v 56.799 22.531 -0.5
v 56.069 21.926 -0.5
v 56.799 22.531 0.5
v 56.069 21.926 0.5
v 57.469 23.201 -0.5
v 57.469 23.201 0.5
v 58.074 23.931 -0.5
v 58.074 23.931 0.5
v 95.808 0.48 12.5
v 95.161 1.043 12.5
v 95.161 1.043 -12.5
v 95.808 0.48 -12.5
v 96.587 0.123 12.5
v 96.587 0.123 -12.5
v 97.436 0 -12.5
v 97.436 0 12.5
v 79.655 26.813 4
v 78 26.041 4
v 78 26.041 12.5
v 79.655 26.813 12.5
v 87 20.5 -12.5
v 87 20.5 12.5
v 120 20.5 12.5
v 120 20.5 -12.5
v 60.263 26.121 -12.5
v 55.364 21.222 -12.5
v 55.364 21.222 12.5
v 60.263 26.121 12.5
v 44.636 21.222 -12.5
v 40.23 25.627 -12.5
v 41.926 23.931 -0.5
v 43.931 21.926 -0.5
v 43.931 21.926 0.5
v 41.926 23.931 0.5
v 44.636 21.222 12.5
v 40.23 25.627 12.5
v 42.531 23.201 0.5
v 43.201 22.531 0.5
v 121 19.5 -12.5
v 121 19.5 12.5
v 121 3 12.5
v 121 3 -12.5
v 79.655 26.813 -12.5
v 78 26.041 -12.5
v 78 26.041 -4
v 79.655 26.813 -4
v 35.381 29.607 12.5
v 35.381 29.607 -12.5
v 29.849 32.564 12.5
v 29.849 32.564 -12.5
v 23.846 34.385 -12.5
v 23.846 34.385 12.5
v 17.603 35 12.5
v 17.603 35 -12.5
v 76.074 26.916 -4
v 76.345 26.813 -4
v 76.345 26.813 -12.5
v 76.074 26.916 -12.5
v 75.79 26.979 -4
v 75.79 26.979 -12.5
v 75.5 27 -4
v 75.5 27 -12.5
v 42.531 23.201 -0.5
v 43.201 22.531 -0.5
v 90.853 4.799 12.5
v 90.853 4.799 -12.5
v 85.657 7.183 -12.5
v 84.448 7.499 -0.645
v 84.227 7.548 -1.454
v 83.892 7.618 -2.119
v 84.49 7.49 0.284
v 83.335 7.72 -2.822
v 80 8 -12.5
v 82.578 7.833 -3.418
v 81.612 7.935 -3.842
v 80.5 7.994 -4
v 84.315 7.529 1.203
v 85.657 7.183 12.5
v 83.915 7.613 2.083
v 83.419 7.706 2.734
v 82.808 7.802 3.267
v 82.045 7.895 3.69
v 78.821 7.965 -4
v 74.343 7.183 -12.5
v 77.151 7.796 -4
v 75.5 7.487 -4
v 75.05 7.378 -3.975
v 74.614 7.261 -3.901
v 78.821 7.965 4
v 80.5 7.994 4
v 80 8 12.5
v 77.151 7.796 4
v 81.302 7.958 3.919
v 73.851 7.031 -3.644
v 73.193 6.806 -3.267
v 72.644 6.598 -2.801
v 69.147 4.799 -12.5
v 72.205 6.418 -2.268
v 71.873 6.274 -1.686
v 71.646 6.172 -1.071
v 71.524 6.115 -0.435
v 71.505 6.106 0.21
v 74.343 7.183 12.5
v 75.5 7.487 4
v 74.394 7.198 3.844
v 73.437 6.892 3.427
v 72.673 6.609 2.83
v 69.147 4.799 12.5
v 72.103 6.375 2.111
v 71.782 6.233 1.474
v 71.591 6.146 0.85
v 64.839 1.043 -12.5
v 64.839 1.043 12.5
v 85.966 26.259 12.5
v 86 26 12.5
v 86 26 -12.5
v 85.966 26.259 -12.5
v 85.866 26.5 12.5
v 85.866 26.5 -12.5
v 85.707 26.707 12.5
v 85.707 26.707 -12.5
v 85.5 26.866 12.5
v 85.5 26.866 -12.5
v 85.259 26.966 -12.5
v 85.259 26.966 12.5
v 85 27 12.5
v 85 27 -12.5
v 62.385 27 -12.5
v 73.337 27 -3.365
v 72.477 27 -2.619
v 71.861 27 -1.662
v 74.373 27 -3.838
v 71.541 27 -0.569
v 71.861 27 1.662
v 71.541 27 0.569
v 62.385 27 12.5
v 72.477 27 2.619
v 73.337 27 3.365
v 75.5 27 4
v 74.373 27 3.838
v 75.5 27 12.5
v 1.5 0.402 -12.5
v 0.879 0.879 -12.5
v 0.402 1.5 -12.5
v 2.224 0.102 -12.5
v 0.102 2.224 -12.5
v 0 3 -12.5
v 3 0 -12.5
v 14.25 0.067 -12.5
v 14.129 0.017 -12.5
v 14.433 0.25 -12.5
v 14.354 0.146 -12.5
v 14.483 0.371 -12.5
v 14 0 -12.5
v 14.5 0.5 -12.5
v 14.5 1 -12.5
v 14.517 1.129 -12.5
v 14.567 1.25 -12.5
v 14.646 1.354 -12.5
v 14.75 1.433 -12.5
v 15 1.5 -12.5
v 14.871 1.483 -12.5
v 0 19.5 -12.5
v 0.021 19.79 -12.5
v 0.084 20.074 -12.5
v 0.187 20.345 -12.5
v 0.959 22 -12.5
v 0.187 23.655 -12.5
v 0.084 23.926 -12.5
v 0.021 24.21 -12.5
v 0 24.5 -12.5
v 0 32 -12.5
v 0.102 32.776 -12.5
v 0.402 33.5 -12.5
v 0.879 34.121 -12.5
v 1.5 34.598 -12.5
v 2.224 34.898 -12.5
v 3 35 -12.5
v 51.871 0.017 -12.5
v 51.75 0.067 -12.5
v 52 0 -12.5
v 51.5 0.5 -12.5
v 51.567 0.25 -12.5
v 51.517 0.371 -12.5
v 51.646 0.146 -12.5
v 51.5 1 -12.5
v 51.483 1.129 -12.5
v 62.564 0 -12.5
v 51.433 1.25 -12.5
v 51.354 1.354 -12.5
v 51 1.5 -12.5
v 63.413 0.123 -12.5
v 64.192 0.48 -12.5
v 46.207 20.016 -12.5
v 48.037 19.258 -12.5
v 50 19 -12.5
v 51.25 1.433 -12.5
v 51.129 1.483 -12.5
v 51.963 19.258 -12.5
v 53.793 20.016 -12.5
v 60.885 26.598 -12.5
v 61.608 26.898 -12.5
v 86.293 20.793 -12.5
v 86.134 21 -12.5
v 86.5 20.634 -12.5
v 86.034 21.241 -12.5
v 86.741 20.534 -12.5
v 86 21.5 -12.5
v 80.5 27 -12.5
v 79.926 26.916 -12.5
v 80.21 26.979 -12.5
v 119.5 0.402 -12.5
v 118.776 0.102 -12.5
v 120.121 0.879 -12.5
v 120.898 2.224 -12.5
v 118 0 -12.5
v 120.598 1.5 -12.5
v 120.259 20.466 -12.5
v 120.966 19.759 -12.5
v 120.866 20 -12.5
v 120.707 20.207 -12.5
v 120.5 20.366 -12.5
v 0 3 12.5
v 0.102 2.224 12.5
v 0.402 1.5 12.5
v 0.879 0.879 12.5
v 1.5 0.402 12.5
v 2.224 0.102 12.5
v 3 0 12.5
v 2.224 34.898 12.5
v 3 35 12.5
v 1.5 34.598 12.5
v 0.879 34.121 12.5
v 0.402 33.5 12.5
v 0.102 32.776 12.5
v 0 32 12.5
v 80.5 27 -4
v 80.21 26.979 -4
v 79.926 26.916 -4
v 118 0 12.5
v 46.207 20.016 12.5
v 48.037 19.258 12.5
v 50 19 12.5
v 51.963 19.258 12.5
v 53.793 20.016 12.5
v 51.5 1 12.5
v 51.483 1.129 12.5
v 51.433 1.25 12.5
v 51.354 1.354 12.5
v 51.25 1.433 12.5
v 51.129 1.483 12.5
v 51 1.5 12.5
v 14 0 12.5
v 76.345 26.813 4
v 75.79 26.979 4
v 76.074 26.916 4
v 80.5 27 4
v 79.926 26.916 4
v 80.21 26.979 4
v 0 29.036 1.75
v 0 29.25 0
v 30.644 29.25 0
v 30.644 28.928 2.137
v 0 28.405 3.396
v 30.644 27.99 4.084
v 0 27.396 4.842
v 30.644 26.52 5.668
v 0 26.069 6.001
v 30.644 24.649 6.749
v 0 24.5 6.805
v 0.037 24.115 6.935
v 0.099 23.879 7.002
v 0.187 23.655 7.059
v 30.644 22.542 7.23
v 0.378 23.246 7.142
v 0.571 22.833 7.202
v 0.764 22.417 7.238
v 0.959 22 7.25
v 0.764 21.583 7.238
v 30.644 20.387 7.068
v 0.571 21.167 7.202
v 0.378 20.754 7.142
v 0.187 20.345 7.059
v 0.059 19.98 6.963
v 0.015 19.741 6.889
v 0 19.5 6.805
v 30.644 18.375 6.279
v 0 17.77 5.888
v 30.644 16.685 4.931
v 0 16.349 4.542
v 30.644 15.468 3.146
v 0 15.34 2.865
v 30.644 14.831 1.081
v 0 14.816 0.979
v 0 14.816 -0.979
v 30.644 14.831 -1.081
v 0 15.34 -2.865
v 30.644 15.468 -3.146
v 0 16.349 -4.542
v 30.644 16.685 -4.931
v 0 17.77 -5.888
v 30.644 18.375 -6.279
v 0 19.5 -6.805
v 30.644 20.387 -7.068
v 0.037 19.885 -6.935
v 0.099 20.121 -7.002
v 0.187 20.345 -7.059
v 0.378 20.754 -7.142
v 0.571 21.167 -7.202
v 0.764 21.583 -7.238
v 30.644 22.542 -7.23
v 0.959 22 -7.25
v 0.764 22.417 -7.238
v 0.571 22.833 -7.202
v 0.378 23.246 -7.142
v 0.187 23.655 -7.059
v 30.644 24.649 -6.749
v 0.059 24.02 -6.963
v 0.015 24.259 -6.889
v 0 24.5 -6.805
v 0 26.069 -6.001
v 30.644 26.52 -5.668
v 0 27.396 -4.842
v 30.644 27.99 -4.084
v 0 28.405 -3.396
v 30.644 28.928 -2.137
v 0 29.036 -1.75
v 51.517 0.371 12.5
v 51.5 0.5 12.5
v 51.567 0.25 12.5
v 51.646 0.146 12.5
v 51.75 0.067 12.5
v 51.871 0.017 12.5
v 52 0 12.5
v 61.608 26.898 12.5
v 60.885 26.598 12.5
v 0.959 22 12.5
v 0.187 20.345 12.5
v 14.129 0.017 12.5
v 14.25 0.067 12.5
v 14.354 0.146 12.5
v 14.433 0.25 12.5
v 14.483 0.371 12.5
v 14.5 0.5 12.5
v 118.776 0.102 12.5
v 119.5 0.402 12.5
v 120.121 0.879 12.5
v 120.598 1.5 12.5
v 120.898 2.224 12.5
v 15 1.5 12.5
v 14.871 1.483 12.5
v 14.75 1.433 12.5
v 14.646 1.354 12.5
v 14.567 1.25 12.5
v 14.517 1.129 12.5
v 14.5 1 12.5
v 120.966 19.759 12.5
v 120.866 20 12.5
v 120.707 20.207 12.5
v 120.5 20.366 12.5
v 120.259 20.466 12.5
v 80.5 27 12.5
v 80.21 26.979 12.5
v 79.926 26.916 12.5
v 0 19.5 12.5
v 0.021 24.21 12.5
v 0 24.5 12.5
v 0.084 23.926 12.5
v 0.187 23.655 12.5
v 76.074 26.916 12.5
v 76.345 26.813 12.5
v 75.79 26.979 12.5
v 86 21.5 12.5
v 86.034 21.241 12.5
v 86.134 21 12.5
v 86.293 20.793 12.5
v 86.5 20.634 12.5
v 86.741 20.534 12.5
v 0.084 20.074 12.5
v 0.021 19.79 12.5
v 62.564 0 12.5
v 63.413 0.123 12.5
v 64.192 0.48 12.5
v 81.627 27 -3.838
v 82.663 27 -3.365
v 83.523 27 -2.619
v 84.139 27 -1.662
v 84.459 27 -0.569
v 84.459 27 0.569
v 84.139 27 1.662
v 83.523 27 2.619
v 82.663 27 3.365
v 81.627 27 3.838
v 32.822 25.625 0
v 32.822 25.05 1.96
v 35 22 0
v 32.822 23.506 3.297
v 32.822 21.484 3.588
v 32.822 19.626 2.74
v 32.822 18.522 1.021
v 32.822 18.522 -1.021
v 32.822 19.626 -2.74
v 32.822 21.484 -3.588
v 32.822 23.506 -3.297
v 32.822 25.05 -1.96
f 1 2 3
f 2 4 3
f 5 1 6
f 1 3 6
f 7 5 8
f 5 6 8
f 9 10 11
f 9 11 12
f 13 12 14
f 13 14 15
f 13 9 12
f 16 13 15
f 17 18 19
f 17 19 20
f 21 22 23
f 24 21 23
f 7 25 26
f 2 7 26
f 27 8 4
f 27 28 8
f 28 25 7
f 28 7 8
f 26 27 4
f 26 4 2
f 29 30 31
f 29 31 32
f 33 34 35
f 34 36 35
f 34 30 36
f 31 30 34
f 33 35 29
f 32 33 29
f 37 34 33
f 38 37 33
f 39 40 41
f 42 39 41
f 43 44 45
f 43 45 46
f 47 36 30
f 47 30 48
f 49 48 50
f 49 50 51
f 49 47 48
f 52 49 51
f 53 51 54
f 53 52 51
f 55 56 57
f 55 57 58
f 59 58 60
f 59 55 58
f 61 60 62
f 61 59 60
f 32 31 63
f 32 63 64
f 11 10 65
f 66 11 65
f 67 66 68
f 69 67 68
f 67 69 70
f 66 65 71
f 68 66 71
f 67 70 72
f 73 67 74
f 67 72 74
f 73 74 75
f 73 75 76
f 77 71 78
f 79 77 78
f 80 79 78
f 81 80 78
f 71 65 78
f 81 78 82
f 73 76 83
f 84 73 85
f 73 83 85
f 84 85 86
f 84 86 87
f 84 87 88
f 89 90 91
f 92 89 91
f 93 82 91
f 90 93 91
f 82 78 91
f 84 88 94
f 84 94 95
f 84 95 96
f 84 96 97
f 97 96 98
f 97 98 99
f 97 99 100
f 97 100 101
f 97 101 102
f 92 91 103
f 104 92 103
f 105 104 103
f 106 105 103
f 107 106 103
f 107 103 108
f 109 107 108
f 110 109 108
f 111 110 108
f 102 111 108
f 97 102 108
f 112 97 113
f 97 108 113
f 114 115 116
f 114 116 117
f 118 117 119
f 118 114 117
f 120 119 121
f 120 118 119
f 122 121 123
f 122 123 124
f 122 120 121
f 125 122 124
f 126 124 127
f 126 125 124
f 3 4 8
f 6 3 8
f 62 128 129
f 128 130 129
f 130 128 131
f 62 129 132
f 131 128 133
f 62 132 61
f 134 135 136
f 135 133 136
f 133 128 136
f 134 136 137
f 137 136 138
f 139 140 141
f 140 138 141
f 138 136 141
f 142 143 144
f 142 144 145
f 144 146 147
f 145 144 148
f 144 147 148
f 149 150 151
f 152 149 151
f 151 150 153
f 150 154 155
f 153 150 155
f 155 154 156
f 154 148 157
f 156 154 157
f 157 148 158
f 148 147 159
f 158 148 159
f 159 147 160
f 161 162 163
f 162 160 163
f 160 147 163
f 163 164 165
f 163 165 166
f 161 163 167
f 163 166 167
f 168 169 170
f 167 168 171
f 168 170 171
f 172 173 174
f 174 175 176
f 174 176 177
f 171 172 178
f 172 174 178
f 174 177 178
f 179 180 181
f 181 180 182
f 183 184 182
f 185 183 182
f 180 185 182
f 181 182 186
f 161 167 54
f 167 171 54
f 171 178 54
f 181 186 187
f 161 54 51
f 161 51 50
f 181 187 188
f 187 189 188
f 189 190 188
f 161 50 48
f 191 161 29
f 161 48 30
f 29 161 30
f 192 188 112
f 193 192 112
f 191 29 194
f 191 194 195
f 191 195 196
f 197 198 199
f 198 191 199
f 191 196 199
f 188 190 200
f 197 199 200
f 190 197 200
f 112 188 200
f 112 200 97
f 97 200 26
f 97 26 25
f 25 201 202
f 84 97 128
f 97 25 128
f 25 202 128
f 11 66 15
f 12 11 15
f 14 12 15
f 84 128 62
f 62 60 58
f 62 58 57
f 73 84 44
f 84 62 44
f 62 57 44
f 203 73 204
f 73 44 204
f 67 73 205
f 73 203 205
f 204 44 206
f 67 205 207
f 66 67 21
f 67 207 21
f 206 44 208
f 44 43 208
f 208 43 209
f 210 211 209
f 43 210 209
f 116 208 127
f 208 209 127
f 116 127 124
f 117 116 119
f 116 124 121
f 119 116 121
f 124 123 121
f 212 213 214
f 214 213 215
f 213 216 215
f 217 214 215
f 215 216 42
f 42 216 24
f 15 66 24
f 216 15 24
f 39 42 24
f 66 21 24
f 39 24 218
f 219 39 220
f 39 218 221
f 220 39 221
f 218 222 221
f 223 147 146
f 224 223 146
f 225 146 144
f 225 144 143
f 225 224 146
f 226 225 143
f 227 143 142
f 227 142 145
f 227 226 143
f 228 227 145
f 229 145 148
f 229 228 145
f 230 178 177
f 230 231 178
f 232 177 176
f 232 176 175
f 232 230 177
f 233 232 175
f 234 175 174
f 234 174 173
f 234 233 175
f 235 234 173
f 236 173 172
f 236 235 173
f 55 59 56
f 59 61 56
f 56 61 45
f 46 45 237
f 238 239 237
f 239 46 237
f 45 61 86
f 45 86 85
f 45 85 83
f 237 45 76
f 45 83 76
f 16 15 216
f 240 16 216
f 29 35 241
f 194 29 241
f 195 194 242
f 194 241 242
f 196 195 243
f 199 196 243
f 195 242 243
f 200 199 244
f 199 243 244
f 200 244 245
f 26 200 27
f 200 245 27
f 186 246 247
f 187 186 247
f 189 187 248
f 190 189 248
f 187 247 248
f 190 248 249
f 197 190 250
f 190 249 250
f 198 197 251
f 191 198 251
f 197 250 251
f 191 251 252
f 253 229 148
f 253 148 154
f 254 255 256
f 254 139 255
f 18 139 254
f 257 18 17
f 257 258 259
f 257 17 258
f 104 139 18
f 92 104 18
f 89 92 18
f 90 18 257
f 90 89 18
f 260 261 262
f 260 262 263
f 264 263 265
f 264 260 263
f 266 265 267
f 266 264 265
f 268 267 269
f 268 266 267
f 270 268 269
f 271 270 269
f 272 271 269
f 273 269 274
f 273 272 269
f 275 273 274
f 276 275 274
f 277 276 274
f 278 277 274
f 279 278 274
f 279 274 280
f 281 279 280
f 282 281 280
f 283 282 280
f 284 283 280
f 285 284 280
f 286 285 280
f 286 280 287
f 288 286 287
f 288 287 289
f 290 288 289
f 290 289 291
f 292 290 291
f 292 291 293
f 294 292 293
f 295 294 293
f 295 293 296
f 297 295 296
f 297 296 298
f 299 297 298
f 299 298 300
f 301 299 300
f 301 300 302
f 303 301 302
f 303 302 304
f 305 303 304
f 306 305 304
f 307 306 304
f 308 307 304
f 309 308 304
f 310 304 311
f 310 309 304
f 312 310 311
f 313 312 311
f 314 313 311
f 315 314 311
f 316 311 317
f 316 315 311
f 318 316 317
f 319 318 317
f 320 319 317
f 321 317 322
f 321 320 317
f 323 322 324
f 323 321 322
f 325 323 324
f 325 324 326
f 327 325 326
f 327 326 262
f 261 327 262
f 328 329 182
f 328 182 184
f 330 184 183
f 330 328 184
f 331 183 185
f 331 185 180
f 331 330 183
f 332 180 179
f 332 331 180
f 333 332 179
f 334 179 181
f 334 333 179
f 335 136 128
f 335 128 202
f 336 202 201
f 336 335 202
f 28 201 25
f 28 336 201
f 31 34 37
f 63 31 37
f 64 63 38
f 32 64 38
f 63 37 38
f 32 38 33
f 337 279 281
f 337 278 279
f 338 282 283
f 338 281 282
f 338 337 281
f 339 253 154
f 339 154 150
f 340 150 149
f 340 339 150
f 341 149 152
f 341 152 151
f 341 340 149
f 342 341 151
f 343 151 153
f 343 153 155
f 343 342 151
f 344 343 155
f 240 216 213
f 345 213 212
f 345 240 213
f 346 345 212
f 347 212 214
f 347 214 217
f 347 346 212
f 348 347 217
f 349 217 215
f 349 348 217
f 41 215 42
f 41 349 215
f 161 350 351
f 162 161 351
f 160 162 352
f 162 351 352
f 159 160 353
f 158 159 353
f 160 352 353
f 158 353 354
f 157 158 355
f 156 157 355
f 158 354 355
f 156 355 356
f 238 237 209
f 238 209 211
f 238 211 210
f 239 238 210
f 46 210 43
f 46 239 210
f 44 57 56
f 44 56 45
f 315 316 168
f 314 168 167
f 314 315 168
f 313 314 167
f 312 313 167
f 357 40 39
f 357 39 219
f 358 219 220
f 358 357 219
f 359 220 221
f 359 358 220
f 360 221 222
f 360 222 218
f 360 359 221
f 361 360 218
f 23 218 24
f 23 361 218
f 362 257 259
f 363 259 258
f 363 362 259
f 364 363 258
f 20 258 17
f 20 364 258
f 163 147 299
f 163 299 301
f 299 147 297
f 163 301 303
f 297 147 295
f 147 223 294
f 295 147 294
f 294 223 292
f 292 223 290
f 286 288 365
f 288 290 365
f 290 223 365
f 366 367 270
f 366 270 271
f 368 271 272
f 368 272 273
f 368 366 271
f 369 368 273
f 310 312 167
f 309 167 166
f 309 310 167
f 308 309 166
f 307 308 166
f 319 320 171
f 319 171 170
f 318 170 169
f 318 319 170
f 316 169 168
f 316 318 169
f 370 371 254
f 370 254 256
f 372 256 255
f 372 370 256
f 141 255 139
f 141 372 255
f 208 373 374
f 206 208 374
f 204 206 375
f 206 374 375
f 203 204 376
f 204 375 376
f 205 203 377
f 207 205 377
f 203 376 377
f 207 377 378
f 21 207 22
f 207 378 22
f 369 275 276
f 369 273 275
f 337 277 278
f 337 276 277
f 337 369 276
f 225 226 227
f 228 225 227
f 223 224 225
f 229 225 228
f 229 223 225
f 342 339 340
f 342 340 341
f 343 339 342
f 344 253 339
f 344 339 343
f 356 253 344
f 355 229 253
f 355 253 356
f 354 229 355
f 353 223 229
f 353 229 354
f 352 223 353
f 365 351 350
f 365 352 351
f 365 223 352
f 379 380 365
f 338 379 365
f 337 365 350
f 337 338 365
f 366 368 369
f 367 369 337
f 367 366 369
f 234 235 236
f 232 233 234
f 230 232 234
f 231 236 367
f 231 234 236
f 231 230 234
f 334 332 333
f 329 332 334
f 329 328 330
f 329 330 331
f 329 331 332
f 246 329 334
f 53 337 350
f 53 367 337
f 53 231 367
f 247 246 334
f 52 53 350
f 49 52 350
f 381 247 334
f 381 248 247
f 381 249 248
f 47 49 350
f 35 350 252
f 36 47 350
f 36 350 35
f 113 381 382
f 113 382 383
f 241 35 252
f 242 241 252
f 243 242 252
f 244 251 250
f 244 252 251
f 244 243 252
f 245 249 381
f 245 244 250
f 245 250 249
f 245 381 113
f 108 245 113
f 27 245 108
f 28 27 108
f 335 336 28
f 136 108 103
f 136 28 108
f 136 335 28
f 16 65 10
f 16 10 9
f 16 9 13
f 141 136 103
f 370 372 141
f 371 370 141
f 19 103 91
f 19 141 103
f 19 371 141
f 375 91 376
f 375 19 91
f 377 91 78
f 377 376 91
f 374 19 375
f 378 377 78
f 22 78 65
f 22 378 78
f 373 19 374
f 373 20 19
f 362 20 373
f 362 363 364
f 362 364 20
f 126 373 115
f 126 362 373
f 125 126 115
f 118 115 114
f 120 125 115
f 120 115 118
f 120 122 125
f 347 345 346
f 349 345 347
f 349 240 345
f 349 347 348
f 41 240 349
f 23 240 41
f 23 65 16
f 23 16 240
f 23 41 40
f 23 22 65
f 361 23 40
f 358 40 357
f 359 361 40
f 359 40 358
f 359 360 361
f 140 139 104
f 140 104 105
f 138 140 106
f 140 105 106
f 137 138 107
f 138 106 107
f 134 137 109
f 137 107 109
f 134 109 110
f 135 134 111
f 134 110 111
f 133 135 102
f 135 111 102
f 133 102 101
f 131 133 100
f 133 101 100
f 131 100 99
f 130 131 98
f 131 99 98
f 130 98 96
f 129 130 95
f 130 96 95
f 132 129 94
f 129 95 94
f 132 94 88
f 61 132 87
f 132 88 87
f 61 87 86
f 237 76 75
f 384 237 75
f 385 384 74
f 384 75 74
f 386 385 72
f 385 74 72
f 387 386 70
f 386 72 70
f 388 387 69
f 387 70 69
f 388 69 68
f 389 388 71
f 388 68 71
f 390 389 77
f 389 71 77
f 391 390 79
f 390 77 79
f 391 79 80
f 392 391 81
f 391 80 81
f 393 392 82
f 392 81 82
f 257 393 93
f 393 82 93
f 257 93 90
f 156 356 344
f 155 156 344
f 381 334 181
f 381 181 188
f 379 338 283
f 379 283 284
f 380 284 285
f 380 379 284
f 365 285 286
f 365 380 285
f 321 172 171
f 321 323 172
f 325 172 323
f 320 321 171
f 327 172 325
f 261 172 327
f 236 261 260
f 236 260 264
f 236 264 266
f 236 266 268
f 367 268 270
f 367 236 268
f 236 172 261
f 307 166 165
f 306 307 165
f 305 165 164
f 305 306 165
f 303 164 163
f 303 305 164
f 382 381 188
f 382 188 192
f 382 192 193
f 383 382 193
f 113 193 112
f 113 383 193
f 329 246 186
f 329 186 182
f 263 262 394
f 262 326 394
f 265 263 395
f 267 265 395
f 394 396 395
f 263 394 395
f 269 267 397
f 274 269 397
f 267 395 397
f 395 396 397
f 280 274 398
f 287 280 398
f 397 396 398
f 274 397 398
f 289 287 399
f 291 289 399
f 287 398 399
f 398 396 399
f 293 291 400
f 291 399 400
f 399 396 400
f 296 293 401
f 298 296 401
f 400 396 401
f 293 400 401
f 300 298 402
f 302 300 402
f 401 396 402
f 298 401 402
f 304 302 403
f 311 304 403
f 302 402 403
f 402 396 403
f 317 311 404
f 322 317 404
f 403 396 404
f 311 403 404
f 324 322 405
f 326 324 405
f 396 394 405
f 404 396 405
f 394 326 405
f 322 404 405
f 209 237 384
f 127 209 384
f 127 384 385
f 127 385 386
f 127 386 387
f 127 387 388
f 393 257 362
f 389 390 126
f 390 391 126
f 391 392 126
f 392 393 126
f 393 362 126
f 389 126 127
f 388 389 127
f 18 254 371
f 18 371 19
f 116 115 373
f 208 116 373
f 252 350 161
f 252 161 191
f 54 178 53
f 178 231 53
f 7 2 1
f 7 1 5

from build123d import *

# Parameters (mm, degrees)
PAD_DEPTH            = 12.5
SKETCH001_R          = 10.1
POCKET_DEPTH         = 0.5
SKETCH002_R          = 7.25
HOLE_DEPTH           = 30.643761
HOLE_TIPS_R          = 7.25
POCKET001_DEPTH      = 35.001
POCKET001_DEPTH_BACK = 0.001


with BuildPart() as part:
    # Sketch → Pad (new body, symmetric)
    with BuildSketch(Plane.XY):
        with BuildLine():
            Line((0, 32), (0, 24.5))
            ThreePointArc((0, 24.5), (0.047408, 24.067121), (0.187384, 23.654763))
            Line((0.187384, 23.654763), (0.959013, 22))
            Line((0.959013, 22), (0.187384, 20.345237))
            ThreePointArc((0.187384, 20.345237), (0.047408, 19.932879), (0, 19.5))
            Line((0, 3), (0, 19.5))
            ThreePointArc((0, 3), (0.87868, 0.87868), (3, 0))
            Line((3, 0), (14, 0))
            ThreePointArc((14, 0), (14.353553, 0.146447), (14.5, 0.5))
            Line((14.5, 1), (14.5, 0.5))
            ThreePointArc((15, 1.5), (14.646447, 1.353553), (14.5, 1))
            Line((15, 1.5), (51, 1.5))
            ThreePointArc((51.5, 1), (51.353553, 1.353553), (51, 1.5))
            Line((51.5, 1), (51.5, 0.5))
            ThreePointArc((51.5, 0.5), (51.646447, 0.146447), (52, 0))
            Line((52, 0), (62.564404, 0))
            ThreePointArc((62.564404, 0), (63.815491, 0.27332), (64.838612, 1.043478))
            ThreePointArc((95.161388, 1.043478), (80, 8), (64.838612, 1.043478))
            ThreePointArc((95.161388, 1.043478), (96.184509, 0.27332), (97.435596, 0))
            Line((97.435596, 0), (118, 0))
            ThreePointArc((118, 0), (120.12132, 0.87868), (121, 3))
            Line((121, 19.5), (121, 3))
            ThreePointArc((121, 19.5), (120.707107, 20.207107), (120, 20.5))
            Line((87, 20.5), (120, 20.5))
            ThreePointArc((86, 21.5), (86.292893, 20.792893), (87, 20.5))
            Line((86, 26), (86, 21.5))
            ThreePointArc((86, 26), (85.707107, 26.707107), (85, 27))
            Line((80.5, 27), (85, 27))
            ThreePointArc((80.5, 27), (80.067121, 26.952592), (79.654763, 26.812616))
            Line((78, 26.040987), (79.654763, 26.812616))
            Line((76.345237, 26.812616), (78, 26.040987))
            ThreePointArc((76.345237, 26.812616), (75.932879, 26.952592), (75.5, 27))
            Line((62.384776, 27), (75.5, 27))
            ThreePointArc((62.384776, 27), (61.236726, 26.771639), (60.263456, 26.12132))
            Line((60.263456, 26.12132), (55.363961, 21.221825))
            ThreePointArc((44.636039, 21.221825), (50, 19), (55.363961, 21.221825))
            Line((40.230447, 25.627417), (44.636039, 21.221825))
            ThreePointArc((40.230447, 25.627417), (29.8489, 32.564145), (17.60303, 35))
            Line((3, 35), (17.60303, 35))
            ThreePointArc((3, 35), (0.87868, 34.12132), (0, 32))
        make_face()
    extrude(amount=PAD_DEPTH, both=True)

    # Sketch001 → Pocket (cut, symmetric)
    with BuildSketch(Plane.XY):
        with Locations((50, 30)):
            Circle(SKETCH001_R)
    extrude(amount=POCKET_DEPTH, both=True, mode=Mode.SUBTRACT)

    # Sketch002 → Hole (cut)
    with BuildSketch(Plane.YZ):
        with Locations((22, 0)):
            Circle(SKETCH002_R)
    extrude(amount=HOLE_DEPTH, mode=Mode.SUBTRACT)

    # Hole tips → Hole tip 1 section 0
    with BuildSketch(Plane.YZ.offset(30.643761), mode=Mode.PRIVATE) as hole_tip_1_s0:
        with Locations((22, 0)):
            Circle(HOLE_TIPS_R)
    loft([hole_tip_1_s0.sketch, Vertex(35, 22, 0)], mode=Mode.SUBTRACT)

    # Sketch003 → Pocket001 (cut, two sides)
    with BuildSketch(Plane.XZ) as pocket001_sk:
        with BuildLine():
            ThreePointArc((75.5, 4), (71.5, 0), (75.5, -4))
            Line((75.5, -4), (80.5, -4))
            ThreePointArc((80.5, -4), (84.5, 0), (80.5, 4))
            Line((75.5, 4), (80.5, 4))
        make_face()
    extrude(amount=-POCKET001_DEPTH, mode=Mode.SUBTRACT)
    extrude(pocket001_sk.sketch, amount=POCKET001_DEPTH_BACK, mode=Mode.SUBTRACT)


solid = part.part
